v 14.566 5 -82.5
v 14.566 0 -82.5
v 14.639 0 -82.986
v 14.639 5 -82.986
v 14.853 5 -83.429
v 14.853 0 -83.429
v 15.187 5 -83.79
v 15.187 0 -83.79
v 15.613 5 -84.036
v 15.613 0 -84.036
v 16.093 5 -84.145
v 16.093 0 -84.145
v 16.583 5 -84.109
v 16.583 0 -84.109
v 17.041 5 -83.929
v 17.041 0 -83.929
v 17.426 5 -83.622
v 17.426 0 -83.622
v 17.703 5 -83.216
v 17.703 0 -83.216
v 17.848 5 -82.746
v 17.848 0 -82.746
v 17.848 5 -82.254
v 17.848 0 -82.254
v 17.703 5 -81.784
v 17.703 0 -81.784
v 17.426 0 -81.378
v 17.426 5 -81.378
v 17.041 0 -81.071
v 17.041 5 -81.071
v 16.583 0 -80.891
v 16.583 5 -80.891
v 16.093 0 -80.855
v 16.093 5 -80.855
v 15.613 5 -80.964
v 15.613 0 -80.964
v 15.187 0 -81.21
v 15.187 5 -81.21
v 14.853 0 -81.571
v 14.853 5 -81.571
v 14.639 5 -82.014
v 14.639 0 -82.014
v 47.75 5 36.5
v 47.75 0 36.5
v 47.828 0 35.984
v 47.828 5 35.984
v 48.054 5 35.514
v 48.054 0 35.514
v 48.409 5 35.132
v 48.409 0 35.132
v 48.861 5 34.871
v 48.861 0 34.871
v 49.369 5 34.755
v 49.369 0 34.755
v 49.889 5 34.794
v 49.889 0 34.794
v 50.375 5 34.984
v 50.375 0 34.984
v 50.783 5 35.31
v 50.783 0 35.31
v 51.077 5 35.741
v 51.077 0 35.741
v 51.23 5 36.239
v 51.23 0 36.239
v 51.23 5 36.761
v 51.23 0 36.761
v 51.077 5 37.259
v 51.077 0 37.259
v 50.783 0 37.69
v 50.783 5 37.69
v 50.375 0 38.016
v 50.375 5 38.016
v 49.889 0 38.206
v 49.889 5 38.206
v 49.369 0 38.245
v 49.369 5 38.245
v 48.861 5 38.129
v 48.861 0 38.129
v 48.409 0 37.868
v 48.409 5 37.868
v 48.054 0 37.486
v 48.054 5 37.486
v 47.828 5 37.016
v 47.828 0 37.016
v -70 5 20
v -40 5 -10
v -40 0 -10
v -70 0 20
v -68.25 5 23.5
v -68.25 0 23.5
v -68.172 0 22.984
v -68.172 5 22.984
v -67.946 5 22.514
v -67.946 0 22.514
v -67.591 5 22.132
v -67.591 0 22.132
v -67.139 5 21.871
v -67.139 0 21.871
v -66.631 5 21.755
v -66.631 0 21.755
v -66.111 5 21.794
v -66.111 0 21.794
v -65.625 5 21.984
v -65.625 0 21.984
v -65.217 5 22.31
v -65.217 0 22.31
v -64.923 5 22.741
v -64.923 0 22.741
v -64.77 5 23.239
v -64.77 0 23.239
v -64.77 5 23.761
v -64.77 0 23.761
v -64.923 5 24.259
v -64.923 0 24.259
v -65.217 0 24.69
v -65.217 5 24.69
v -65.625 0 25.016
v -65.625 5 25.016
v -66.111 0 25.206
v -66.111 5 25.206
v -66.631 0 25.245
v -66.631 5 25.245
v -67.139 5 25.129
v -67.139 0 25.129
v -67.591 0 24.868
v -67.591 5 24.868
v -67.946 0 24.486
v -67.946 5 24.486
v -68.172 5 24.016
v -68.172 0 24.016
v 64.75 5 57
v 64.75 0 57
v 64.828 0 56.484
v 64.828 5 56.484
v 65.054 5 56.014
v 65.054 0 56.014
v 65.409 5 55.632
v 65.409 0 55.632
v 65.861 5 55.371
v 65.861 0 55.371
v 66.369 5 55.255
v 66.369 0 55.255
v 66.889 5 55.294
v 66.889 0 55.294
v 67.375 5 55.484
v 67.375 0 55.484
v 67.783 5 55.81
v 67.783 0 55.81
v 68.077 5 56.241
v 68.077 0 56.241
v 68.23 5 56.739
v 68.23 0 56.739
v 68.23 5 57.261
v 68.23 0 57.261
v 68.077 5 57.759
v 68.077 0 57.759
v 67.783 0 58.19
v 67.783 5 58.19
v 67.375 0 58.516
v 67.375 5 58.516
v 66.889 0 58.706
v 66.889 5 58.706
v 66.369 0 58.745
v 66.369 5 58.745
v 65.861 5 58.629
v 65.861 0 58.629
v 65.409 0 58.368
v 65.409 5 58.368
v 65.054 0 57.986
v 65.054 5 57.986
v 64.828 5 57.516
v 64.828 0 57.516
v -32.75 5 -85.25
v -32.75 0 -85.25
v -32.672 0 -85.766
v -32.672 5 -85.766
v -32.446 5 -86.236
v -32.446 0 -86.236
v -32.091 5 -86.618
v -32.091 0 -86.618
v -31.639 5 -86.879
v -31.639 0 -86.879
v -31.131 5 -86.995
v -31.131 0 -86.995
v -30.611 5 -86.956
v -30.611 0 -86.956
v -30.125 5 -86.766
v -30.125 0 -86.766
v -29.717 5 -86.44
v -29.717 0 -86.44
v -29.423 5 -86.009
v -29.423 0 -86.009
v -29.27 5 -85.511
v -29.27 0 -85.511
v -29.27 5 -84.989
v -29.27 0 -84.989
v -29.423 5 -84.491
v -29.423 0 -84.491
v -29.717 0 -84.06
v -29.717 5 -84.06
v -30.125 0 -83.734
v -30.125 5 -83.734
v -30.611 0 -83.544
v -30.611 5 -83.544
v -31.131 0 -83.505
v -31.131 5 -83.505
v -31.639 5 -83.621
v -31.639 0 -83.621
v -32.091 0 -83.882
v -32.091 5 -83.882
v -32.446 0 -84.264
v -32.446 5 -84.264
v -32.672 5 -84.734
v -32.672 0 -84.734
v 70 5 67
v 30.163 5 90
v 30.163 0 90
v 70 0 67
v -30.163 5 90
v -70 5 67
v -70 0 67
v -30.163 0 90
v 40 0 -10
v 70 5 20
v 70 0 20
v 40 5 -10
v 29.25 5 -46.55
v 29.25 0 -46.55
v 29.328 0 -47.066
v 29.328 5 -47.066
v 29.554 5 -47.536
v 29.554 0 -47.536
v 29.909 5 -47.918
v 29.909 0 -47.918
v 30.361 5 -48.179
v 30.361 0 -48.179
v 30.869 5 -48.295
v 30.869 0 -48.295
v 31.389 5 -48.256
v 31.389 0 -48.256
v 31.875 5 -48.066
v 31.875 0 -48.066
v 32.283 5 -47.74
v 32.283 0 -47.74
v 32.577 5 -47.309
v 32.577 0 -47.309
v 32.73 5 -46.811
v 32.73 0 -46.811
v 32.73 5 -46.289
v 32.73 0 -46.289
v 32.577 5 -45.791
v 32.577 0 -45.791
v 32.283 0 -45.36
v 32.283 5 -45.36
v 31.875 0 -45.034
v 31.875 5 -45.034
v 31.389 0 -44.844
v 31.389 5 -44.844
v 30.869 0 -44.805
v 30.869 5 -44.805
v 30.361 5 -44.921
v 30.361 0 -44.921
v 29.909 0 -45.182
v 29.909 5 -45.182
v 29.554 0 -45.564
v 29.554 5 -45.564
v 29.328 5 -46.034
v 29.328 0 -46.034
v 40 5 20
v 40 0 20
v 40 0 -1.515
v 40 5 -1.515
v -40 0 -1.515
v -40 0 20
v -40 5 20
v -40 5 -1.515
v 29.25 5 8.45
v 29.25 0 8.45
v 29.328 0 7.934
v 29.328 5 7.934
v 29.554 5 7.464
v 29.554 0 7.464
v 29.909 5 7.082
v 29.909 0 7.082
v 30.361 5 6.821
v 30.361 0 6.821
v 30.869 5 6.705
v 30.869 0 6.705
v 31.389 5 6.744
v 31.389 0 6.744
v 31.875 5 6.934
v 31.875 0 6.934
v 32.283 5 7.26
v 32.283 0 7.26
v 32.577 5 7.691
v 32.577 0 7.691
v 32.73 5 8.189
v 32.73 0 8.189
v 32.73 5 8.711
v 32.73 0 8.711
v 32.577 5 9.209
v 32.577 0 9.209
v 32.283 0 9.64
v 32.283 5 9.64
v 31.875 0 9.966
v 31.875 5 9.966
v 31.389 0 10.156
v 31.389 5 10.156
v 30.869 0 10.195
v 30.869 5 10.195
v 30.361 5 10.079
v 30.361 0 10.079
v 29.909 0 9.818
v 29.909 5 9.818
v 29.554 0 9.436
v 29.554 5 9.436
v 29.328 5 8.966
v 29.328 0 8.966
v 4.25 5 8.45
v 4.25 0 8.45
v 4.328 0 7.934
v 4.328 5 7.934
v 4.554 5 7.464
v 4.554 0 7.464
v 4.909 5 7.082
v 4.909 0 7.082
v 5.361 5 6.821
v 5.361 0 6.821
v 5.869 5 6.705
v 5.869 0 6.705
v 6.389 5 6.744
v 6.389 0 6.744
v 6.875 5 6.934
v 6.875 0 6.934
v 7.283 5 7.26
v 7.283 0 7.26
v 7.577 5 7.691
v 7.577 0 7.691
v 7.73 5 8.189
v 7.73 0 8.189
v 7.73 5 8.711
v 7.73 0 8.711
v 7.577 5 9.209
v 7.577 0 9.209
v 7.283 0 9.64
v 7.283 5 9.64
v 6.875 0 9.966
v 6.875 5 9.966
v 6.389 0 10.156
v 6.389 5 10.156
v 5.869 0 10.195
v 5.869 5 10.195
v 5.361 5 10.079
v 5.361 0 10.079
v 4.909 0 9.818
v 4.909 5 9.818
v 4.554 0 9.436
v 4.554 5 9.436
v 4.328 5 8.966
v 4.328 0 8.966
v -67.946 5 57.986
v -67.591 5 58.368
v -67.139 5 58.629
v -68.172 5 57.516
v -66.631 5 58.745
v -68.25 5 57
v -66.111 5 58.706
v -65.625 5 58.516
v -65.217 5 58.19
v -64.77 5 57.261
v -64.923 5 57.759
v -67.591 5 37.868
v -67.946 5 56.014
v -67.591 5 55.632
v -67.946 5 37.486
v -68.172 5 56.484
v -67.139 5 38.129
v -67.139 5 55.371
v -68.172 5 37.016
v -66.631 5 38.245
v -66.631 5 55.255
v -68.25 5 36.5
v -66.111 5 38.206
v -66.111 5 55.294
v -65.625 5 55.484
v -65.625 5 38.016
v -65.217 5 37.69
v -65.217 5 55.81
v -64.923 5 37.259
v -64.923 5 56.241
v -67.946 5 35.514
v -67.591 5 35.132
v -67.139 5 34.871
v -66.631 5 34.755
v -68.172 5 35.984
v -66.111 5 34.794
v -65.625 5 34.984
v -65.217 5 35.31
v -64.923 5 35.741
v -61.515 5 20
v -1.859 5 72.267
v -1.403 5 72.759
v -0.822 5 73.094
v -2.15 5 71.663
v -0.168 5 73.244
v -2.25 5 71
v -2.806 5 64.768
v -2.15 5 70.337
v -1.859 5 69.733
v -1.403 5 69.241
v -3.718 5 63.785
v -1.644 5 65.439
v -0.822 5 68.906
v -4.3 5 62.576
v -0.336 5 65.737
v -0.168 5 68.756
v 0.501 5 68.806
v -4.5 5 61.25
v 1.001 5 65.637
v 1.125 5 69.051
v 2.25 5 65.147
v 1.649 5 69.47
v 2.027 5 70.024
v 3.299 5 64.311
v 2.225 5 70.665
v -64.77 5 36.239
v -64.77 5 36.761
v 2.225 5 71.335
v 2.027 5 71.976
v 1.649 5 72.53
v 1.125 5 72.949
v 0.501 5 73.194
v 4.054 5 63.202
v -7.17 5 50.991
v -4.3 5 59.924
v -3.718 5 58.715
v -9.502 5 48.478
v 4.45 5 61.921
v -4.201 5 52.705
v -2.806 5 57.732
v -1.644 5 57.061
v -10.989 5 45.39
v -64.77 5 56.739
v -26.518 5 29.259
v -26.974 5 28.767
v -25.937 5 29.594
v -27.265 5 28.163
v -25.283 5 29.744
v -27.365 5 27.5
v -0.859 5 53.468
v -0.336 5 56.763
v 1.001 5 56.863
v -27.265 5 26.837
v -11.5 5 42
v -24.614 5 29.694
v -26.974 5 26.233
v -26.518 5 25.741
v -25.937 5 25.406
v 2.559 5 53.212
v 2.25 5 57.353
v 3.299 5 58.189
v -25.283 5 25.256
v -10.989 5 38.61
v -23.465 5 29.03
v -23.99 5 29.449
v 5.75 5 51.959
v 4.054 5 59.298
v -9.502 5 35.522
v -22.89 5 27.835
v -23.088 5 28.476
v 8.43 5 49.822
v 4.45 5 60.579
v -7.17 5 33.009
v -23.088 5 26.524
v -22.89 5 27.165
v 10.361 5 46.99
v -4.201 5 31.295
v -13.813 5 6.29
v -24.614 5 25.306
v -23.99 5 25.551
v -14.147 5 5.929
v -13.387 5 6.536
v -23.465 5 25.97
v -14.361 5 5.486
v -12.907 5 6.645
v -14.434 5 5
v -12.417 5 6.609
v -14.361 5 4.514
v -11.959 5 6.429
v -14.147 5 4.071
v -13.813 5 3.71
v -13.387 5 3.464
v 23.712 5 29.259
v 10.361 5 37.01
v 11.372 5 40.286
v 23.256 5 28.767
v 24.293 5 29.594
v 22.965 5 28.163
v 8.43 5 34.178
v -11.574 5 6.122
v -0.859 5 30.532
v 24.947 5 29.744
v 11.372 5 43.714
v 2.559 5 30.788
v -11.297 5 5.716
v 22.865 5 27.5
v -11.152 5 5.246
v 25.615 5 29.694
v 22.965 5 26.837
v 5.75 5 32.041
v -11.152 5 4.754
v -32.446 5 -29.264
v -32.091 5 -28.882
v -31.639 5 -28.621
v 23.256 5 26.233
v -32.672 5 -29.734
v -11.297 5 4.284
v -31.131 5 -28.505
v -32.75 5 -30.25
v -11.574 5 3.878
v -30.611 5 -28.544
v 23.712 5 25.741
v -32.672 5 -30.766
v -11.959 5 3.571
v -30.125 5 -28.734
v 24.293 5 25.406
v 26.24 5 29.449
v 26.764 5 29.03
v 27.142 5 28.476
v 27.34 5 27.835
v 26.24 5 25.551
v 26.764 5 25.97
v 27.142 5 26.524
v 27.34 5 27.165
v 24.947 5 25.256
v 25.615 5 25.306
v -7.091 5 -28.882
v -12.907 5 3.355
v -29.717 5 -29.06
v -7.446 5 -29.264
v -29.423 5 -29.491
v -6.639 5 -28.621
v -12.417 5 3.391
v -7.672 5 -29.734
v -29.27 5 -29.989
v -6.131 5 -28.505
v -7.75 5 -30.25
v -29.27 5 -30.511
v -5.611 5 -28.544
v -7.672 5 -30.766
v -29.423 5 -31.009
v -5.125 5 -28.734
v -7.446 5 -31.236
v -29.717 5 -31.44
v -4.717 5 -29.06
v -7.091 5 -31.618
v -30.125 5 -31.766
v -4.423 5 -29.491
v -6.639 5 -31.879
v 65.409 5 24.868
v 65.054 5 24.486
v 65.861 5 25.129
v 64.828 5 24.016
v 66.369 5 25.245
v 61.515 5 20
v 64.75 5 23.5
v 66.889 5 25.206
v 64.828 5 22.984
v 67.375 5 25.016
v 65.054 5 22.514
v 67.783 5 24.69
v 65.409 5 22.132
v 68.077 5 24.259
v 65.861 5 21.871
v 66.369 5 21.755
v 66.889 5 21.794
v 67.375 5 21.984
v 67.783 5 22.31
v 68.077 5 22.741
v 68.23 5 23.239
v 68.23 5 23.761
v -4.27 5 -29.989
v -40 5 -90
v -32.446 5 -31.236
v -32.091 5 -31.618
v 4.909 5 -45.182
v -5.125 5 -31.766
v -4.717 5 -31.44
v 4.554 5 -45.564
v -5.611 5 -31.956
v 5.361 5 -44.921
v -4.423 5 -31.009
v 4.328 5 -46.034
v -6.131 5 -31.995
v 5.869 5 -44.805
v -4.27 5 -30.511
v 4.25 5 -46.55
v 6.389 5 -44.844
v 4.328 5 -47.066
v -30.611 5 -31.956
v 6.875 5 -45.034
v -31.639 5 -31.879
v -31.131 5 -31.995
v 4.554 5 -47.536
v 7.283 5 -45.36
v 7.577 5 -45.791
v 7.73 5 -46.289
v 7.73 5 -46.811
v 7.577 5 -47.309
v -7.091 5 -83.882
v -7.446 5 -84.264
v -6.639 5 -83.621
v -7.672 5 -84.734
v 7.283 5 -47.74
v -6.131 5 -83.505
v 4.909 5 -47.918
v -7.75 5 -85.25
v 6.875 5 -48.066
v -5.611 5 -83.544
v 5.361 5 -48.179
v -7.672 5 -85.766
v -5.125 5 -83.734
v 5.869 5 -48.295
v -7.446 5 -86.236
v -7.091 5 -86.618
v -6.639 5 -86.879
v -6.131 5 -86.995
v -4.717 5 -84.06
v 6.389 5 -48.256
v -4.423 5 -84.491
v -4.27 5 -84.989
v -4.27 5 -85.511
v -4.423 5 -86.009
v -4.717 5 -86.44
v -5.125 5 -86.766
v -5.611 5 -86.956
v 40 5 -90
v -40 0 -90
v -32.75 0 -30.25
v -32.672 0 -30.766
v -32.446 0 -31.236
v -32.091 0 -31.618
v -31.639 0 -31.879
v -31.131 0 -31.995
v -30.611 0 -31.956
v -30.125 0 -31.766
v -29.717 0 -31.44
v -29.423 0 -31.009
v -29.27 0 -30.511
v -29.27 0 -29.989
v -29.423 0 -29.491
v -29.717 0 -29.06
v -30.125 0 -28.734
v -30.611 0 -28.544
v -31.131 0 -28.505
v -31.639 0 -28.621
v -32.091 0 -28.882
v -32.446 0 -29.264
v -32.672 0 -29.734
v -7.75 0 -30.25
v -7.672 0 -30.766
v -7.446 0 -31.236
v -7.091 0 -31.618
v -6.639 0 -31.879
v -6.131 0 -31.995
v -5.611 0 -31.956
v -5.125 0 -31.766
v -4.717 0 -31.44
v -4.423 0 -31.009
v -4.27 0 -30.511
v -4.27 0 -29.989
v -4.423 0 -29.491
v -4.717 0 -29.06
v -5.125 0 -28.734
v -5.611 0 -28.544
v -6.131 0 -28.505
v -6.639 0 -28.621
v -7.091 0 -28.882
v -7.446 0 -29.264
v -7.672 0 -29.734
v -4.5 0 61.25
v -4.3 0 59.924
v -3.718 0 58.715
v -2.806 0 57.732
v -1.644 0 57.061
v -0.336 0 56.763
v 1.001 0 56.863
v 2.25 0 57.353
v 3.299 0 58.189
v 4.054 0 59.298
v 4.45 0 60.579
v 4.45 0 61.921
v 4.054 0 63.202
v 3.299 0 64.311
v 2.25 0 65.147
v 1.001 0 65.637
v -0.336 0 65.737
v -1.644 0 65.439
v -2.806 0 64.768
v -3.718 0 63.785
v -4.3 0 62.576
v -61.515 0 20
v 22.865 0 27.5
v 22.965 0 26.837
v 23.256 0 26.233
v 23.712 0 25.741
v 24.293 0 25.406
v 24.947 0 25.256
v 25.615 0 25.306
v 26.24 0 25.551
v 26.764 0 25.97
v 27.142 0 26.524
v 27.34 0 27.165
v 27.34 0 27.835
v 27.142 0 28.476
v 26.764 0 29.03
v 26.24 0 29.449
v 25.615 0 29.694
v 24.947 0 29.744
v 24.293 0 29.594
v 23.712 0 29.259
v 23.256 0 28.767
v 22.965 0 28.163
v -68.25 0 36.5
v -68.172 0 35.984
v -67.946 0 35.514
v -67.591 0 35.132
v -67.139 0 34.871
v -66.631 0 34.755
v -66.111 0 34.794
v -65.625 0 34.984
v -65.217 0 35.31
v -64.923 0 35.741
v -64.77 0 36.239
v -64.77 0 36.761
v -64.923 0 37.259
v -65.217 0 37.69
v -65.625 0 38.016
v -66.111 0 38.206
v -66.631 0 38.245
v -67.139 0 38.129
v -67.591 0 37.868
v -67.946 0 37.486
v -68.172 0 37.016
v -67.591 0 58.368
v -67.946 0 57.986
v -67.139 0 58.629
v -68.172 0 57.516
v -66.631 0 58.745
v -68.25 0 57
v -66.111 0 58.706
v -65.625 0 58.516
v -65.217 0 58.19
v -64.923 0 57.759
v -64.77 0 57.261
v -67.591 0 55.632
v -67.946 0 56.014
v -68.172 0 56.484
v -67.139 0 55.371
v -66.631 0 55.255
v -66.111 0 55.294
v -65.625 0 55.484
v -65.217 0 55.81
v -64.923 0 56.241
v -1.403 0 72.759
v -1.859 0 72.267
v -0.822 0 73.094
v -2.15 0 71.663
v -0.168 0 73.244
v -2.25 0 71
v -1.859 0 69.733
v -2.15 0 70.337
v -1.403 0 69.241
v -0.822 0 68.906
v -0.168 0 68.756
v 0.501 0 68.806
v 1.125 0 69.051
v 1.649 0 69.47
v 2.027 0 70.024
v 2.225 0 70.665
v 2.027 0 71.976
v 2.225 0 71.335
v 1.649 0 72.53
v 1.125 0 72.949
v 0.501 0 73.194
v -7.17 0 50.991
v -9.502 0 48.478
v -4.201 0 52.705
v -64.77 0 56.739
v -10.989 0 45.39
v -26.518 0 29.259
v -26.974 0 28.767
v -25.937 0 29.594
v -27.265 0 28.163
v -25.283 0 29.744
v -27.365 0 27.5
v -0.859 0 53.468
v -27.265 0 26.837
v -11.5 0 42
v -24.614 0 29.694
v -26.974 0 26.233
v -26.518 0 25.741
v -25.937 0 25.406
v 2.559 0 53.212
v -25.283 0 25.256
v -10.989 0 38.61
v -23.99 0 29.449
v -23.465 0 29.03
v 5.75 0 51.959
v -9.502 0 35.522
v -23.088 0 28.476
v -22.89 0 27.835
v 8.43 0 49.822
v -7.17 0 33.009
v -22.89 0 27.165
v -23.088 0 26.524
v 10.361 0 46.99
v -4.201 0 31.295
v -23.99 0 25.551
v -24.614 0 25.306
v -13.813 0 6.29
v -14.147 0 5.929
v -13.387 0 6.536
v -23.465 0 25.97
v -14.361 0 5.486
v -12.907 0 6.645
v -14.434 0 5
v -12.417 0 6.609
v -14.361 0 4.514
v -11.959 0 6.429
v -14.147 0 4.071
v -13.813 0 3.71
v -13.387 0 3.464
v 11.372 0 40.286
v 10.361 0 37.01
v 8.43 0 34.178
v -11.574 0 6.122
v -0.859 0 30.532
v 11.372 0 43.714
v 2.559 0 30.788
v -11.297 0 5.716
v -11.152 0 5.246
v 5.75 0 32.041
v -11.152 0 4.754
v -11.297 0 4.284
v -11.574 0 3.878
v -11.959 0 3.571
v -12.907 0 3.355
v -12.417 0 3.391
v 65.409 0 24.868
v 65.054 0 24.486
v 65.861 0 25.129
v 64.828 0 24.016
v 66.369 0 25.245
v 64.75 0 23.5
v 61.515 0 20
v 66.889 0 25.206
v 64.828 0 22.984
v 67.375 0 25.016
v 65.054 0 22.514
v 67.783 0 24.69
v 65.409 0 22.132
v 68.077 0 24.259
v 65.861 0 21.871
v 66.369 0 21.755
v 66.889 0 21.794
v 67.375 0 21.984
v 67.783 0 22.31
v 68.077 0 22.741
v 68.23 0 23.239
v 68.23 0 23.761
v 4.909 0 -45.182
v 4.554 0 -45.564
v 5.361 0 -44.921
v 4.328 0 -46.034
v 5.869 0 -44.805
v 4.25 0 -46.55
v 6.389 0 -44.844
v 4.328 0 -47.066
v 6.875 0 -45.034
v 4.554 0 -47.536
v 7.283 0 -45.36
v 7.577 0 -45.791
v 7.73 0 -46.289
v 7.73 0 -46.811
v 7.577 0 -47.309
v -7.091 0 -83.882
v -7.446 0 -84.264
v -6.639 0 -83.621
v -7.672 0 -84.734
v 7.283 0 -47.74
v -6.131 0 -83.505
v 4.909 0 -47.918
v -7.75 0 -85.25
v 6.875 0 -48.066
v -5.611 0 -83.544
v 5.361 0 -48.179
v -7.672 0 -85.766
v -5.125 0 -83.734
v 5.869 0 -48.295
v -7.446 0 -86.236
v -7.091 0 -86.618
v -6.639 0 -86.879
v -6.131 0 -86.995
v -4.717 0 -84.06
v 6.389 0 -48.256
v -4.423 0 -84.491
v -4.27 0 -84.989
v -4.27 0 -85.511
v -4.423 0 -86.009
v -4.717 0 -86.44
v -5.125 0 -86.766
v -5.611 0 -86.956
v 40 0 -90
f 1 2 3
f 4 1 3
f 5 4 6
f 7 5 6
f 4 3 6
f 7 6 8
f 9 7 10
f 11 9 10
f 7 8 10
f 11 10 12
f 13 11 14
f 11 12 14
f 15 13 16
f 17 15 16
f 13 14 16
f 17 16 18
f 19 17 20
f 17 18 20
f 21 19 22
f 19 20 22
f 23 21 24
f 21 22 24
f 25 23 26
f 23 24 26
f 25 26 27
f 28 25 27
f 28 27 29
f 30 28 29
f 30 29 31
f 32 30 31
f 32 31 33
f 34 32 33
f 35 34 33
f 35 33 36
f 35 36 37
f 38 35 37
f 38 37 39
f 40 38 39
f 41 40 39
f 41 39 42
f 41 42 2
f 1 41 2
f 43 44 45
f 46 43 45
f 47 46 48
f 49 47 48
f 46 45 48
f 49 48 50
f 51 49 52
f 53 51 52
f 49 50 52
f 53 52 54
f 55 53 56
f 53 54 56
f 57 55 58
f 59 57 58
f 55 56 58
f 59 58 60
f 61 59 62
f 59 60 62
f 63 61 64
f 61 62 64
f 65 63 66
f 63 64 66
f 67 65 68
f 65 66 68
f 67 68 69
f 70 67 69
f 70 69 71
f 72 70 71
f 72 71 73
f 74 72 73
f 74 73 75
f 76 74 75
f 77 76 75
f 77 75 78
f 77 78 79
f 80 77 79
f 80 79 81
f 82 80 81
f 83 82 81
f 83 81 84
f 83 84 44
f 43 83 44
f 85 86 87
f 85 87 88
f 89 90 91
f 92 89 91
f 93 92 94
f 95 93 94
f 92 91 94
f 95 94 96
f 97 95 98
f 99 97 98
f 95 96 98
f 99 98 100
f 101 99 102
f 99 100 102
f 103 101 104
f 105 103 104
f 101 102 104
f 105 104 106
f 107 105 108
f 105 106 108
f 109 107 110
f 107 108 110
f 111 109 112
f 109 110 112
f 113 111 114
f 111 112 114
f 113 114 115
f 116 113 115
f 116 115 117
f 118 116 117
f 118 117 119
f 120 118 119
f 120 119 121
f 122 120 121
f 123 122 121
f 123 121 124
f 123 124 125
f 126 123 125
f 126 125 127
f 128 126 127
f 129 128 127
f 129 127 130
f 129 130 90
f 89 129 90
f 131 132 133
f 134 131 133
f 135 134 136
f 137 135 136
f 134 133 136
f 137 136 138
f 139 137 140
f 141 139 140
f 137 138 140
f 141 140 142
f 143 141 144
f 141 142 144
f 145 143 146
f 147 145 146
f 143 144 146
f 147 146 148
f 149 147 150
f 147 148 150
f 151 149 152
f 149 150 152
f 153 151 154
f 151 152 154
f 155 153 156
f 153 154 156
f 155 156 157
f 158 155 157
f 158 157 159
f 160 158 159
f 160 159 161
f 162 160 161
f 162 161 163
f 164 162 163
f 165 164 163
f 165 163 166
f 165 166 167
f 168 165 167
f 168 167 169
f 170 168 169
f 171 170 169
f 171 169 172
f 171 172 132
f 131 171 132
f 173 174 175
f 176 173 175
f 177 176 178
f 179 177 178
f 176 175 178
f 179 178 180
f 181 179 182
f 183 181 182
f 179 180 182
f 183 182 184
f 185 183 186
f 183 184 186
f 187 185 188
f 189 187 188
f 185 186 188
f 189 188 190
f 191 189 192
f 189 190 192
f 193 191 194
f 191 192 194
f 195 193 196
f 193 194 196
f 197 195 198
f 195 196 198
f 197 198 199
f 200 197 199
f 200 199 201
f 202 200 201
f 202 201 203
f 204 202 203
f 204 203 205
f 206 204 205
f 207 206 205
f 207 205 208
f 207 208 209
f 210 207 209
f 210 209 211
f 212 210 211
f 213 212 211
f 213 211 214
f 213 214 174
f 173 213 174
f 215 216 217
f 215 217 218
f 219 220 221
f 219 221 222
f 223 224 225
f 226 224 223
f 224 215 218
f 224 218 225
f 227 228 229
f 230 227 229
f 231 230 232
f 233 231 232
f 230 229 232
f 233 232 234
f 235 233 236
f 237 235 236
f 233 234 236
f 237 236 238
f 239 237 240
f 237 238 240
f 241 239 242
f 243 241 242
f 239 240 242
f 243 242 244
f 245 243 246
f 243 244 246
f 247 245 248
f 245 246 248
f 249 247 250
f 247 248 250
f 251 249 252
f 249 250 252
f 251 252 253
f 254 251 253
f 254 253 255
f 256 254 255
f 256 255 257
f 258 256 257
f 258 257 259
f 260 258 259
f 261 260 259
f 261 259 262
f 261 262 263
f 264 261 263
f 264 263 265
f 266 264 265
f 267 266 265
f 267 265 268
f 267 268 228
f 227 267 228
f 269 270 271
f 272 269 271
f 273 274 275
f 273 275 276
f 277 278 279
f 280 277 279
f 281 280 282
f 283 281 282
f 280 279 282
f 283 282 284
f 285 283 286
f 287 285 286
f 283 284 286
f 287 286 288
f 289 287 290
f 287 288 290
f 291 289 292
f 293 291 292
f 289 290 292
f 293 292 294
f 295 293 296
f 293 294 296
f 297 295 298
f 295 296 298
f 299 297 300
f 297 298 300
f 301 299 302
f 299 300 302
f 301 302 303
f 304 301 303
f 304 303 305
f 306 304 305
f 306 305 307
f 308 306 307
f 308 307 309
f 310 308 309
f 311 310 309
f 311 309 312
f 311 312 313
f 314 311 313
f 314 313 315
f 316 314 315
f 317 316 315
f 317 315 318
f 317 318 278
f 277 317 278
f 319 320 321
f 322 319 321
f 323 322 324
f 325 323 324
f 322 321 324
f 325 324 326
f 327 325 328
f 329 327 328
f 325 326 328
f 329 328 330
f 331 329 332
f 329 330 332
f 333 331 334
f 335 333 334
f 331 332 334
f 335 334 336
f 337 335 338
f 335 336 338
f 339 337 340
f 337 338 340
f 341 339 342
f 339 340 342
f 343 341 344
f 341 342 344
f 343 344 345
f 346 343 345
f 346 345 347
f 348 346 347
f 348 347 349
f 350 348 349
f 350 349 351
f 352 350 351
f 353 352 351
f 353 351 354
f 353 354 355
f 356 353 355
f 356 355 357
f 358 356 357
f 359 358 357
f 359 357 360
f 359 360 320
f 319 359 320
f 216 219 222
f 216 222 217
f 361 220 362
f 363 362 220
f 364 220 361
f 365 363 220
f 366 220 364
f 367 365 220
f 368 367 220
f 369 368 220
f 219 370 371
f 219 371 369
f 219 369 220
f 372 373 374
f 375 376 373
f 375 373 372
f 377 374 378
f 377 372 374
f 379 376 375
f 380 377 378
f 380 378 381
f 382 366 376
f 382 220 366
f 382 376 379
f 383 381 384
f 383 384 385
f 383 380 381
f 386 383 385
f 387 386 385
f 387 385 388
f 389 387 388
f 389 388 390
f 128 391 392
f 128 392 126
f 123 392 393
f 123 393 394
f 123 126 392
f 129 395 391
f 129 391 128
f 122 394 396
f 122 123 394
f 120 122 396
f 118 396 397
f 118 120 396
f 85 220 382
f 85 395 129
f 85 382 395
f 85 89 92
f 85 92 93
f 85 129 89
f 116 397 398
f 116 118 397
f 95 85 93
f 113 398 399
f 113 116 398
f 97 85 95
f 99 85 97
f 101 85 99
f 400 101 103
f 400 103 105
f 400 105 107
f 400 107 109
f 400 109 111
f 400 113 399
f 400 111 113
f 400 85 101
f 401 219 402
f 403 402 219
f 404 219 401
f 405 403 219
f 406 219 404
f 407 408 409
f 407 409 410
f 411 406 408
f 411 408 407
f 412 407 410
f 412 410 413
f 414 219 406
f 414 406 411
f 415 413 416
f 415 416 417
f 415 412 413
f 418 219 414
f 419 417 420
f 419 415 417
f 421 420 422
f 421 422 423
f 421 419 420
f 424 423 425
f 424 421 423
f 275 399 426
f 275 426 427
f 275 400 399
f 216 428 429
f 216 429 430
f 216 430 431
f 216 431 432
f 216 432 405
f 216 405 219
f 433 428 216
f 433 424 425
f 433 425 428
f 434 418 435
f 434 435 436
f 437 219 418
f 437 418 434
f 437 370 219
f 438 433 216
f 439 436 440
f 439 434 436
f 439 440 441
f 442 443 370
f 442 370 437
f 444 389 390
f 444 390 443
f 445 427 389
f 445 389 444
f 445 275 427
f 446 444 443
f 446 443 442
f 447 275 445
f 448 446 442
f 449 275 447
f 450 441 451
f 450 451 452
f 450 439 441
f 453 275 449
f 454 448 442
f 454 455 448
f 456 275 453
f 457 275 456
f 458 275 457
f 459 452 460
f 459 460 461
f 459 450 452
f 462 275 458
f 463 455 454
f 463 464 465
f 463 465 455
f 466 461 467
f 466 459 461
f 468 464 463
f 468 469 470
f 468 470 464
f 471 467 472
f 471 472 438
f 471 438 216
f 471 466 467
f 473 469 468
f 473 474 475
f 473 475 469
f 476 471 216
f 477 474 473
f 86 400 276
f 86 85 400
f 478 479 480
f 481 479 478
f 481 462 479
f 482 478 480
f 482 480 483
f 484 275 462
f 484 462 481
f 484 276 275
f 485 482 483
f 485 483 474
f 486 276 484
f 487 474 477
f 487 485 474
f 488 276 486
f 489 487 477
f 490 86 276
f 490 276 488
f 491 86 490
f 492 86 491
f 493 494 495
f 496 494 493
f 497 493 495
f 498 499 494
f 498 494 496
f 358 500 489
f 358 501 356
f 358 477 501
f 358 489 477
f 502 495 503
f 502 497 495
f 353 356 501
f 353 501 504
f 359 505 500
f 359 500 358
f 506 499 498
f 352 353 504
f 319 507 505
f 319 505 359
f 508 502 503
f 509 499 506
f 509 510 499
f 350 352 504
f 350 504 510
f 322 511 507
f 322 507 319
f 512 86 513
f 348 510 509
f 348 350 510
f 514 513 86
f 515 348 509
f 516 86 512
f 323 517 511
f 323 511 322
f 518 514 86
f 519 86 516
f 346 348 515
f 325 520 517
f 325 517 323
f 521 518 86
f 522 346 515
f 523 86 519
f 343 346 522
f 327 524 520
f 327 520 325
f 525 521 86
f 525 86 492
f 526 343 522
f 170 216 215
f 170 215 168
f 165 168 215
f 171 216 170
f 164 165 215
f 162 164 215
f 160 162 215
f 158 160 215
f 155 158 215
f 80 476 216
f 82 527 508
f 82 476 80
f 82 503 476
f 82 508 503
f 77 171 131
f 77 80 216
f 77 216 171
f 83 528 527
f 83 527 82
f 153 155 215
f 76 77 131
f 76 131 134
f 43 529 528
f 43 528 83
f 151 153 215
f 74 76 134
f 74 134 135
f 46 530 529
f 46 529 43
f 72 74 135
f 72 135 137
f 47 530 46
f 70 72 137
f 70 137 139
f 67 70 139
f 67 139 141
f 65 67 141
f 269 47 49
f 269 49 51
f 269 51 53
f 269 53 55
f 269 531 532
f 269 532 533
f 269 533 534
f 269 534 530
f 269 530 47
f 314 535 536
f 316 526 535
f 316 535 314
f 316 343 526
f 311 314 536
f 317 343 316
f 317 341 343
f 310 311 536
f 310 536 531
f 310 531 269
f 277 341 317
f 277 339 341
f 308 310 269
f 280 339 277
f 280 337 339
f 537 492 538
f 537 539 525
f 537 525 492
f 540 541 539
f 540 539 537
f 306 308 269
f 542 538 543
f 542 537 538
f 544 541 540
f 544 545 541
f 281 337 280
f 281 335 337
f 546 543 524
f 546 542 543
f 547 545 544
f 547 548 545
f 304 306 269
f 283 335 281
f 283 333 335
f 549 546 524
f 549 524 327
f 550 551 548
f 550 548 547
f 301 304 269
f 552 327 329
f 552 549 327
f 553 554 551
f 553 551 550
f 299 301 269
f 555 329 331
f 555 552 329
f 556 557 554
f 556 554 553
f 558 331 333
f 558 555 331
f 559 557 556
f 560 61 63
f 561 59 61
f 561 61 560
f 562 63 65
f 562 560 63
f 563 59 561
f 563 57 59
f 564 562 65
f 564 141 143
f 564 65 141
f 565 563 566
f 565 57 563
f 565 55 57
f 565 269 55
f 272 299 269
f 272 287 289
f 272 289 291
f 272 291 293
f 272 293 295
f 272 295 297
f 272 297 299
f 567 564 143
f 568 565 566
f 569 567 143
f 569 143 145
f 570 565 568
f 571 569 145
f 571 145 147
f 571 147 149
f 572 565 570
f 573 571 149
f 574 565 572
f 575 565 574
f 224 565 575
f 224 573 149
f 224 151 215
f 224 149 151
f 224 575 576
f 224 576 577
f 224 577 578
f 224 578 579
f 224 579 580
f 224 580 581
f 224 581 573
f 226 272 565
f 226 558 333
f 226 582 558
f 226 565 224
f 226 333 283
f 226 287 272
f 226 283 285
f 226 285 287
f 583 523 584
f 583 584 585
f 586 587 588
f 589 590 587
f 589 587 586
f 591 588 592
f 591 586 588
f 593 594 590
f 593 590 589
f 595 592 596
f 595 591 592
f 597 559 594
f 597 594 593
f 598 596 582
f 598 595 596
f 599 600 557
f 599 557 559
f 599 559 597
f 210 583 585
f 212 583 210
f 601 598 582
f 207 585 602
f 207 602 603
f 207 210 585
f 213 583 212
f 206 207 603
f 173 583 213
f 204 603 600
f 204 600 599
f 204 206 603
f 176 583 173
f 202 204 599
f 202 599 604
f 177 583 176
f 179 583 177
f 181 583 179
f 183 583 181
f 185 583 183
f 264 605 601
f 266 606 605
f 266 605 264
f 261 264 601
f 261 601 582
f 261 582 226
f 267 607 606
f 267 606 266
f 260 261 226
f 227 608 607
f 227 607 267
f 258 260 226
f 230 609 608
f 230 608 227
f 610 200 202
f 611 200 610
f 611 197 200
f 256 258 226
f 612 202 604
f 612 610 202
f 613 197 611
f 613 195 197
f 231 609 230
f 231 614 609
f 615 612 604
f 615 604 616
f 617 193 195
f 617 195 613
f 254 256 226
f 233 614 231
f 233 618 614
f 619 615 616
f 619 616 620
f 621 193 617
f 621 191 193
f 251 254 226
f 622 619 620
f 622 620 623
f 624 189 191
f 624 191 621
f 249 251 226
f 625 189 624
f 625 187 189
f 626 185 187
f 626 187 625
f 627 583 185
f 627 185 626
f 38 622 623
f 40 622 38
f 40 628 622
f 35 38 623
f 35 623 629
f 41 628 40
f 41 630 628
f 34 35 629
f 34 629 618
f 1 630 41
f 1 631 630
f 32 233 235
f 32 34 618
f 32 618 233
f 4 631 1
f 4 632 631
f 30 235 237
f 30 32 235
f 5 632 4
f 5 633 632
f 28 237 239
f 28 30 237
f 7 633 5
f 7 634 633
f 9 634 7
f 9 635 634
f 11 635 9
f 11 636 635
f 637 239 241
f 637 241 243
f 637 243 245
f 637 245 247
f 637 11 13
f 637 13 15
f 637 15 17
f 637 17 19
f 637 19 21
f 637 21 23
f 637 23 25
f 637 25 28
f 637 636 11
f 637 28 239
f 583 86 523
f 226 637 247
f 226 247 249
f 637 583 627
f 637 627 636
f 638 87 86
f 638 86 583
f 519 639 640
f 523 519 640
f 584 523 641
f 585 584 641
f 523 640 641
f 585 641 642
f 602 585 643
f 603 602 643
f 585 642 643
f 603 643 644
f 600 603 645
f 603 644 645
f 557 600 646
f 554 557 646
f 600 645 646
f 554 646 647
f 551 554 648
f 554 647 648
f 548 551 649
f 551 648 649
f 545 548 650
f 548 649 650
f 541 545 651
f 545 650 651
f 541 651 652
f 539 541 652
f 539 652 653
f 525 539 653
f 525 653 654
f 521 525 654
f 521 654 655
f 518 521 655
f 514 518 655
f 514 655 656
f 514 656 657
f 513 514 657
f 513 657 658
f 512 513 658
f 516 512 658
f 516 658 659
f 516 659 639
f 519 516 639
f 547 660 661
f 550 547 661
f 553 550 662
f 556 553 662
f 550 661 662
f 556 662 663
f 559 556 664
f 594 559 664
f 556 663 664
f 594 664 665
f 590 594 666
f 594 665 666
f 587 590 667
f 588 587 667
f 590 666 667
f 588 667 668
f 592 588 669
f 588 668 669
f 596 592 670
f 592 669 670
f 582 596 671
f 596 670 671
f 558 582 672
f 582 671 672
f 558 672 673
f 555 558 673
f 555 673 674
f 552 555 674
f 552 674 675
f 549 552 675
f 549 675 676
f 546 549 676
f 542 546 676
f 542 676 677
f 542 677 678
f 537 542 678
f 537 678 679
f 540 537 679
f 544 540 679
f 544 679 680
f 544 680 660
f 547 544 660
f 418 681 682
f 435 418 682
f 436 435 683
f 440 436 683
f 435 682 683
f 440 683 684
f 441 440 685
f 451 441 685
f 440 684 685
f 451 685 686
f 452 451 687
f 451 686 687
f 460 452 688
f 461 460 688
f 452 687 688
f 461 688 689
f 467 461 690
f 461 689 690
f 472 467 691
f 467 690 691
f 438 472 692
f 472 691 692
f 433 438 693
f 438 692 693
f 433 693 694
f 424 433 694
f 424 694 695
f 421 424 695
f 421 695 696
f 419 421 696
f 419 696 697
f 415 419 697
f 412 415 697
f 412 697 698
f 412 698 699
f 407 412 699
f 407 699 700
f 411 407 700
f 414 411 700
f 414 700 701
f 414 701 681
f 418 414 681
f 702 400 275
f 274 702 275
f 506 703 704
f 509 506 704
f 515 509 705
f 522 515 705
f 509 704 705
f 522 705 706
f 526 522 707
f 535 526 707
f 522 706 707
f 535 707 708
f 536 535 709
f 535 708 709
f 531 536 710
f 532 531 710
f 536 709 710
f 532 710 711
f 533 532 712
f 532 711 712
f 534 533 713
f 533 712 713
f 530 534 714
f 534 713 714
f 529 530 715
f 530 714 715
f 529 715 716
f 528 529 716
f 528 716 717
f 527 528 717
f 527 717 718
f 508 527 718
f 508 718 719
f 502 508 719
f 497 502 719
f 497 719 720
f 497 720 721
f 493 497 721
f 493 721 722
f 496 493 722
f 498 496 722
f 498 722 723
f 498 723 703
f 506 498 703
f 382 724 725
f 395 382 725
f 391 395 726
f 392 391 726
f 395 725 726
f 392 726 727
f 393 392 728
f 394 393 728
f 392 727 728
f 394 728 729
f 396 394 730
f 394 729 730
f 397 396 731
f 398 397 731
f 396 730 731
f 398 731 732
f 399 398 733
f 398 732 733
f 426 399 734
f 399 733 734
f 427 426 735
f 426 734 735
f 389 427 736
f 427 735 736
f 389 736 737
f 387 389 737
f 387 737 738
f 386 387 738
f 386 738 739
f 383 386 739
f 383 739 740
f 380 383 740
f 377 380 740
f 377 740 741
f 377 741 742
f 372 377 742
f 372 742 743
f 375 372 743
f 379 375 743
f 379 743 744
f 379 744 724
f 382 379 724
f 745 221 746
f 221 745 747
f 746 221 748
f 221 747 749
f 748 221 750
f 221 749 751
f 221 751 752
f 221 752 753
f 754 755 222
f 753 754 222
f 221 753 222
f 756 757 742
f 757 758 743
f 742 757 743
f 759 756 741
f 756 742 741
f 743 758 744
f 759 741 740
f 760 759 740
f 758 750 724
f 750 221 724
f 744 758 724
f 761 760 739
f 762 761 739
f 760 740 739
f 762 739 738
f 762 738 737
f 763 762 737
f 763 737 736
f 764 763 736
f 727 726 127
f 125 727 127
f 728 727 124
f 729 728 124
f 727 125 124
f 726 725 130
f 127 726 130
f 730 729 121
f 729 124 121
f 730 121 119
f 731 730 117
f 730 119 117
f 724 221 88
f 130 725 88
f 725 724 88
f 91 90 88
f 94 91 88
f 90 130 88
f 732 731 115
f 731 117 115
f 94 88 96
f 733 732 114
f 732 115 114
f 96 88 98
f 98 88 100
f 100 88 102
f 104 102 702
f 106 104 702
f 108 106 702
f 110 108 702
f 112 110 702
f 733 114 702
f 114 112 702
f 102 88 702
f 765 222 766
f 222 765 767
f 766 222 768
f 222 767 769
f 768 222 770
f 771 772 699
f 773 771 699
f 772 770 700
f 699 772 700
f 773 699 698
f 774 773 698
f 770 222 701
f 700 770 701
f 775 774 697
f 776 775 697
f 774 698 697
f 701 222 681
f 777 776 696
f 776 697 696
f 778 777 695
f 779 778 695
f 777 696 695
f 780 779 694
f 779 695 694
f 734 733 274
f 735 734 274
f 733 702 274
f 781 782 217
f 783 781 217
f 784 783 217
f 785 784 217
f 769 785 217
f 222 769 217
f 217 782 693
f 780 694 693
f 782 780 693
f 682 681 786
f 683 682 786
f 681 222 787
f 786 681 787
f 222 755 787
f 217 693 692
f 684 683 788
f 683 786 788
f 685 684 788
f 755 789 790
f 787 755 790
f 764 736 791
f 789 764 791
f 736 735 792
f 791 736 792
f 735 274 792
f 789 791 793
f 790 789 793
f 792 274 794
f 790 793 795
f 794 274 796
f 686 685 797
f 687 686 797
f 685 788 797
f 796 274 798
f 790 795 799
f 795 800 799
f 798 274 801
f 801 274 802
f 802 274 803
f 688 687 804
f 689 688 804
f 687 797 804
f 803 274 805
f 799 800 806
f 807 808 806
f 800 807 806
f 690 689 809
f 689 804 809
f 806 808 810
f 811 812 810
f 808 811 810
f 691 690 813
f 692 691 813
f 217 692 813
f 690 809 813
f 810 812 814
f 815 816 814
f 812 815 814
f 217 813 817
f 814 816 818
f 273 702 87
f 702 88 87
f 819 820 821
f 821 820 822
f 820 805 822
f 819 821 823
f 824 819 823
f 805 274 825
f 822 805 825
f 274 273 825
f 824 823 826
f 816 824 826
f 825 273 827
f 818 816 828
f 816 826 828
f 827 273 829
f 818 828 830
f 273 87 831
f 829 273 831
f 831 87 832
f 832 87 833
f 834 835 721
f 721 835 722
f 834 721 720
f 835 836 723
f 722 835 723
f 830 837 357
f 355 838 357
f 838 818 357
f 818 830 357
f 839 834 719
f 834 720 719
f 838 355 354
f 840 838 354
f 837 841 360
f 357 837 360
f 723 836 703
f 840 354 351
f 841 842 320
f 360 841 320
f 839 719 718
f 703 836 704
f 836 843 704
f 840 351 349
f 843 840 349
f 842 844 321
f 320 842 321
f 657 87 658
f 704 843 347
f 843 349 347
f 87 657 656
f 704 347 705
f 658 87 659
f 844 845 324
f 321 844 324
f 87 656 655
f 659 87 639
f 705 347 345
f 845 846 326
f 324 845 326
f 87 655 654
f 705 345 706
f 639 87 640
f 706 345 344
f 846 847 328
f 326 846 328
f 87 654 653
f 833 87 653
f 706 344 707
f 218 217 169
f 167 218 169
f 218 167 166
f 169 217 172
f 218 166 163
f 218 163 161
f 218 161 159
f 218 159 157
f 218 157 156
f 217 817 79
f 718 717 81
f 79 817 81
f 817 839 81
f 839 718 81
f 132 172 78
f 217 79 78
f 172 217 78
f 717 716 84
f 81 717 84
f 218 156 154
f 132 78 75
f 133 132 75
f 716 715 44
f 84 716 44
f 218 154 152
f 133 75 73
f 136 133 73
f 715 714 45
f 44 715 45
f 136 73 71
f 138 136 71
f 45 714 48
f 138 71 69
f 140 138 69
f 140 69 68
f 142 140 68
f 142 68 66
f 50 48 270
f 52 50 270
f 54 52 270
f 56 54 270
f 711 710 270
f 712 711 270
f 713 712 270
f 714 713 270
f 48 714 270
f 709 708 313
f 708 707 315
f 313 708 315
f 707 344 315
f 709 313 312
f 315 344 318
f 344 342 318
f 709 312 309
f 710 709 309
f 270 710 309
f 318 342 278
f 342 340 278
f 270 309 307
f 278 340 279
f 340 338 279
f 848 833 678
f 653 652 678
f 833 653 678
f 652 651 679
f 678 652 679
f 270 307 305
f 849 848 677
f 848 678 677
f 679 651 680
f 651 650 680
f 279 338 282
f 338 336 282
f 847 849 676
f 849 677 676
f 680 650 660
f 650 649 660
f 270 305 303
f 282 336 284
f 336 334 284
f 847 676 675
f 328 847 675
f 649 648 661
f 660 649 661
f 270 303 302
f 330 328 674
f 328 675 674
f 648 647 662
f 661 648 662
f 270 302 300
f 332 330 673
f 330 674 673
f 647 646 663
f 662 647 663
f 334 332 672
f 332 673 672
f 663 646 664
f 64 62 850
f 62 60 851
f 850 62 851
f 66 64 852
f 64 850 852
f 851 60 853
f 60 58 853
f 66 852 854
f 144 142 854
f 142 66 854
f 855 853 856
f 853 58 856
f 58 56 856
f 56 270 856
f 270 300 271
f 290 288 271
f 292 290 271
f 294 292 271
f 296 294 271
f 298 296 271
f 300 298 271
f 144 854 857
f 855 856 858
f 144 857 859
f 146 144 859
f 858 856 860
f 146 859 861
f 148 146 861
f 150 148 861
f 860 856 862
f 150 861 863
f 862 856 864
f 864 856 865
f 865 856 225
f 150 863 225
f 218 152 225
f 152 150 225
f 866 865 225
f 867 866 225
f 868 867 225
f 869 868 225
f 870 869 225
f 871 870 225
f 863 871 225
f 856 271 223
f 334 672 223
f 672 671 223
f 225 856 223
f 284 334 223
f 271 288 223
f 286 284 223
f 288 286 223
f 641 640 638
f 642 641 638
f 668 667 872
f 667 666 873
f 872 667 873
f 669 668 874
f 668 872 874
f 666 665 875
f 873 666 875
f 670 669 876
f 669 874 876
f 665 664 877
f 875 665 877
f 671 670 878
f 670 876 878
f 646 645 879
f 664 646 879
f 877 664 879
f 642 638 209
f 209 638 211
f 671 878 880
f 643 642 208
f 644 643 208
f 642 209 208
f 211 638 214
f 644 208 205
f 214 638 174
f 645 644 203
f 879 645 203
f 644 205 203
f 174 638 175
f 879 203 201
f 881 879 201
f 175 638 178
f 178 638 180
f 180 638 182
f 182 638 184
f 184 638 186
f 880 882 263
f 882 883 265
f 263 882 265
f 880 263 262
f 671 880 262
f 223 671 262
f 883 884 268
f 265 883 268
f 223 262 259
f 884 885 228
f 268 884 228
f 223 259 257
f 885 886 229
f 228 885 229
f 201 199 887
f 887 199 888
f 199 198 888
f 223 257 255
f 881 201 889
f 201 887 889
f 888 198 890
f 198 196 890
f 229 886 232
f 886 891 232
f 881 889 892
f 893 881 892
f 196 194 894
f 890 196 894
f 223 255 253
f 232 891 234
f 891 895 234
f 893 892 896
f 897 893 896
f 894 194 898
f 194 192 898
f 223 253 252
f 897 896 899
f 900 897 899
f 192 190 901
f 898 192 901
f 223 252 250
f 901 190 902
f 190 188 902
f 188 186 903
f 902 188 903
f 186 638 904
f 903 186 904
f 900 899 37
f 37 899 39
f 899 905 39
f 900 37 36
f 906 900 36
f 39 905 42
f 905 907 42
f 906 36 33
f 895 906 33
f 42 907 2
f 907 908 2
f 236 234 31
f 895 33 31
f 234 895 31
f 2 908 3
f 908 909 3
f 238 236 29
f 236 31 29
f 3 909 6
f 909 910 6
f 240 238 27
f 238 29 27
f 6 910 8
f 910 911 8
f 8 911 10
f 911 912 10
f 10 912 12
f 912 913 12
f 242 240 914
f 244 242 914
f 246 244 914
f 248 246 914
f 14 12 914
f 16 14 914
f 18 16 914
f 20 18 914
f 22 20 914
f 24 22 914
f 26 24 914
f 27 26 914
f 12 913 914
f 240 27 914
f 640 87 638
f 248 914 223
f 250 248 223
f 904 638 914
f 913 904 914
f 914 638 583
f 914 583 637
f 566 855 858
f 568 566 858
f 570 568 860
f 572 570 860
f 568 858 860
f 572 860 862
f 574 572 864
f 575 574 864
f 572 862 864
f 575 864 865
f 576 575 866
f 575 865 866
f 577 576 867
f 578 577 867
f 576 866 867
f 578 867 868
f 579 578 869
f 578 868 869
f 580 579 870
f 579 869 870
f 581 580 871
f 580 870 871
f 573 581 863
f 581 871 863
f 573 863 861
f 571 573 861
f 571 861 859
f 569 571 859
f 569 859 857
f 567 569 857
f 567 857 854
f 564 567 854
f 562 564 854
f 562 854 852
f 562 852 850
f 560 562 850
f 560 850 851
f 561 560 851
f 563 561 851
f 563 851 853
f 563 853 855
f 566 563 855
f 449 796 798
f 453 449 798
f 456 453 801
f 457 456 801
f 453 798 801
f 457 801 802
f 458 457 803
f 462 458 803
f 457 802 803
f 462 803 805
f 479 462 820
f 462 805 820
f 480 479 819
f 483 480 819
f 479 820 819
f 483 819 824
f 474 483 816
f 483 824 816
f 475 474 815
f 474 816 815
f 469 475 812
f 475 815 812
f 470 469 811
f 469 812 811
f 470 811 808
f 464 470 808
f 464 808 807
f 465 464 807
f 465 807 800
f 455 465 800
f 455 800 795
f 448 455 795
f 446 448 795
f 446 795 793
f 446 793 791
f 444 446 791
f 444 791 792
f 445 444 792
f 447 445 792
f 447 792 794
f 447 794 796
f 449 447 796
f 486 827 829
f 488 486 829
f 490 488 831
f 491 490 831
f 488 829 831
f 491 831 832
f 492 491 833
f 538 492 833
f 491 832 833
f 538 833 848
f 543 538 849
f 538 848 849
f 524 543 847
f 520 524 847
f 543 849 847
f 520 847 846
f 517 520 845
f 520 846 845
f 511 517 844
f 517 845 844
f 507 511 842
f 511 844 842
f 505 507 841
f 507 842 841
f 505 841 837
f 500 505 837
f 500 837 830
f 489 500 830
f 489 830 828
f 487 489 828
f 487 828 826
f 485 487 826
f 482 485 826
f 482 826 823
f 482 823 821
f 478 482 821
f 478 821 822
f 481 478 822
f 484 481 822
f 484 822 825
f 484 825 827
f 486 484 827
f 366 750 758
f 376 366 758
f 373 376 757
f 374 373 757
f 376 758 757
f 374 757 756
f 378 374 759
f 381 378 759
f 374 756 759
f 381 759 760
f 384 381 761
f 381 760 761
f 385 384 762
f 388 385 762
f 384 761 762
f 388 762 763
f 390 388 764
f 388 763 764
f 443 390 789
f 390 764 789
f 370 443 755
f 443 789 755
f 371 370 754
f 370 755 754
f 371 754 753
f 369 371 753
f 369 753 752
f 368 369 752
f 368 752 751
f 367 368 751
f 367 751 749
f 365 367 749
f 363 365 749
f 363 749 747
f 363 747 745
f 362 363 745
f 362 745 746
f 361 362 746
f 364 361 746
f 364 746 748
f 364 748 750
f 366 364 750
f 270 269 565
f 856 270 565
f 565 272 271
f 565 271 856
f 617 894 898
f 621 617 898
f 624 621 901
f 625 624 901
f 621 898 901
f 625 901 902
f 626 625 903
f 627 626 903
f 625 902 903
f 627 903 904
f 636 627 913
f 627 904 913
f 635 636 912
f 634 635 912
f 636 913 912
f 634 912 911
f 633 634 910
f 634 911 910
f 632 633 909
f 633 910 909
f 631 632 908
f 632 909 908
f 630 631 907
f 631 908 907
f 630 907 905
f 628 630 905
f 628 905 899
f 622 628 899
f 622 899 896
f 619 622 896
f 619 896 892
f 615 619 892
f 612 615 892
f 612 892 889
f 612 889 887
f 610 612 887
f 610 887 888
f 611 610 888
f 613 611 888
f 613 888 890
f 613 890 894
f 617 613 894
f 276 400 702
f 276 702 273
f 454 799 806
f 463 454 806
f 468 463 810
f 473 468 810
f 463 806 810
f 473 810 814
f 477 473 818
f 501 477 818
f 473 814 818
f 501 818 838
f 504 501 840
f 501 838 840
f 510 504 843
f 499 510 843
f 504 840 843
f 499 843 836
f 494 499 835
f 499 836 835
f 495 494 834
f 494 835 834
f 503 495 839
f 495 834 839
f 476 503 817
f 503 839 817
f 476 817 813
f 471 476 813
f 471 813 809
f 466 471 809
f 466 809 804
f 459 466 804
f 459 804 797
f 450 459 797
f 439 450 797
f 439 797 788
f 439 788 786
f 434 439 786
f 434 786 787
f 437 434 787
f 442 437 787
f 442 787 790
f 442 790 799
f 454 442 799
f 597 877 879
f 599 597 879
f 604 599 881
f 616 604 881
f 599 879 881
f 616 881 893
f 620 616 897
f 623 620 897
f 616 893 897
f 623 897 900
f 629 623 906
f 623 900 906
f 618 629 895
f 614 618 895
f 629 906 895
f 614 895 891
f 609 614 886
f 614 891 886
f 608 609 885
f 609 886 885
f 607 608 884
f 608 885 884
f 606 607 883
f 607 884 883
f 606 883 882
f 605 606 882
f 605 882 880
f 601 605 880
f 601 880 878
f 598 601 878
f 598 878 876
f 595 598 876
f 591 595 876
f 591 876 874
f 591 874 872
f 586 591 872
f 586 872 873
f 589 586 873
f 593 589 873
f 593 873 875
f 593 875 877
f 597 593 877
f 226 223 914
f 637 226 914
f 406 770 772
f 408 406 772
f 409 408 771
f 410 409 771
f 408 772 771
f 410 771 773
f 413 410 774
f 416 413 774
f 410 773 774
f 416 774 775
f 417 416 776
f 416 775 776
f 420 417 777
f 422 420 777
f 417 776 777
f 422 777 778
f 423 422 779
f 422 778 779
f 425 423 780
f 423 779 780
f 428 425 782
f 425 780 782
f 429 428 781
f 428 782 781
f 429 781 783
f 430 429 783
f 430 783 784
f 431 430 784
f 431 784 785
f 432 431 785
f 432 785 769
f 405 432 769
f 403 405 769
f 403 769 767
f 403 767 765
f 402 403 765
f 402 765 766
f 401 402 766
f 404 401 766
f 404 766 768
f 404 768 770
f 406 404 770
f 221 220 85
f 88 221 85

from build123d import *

# Parameters (mm, degrees)
SKETCH_1_W          = 80
SKETCH_1_H          = 180
EXTRUDE_1_DEPTH     = 5
HOLE_WIZARD_1_D     = 3.5
HOLE_WIZARD_2_D     = 4.5
HOLE_WIZARD_3_D     = 23
HOLE_WIZARD_4_D     = 9
SKETCH_13_W         = 30
SKETCH_13_H         = 70
EXTRUDE_2_DEPTH     = 5
EXTRUDE_3_DEPTH     = 5
HOLE_WIZARD_5_D     = 3.5
CUT_EXTRUDE_1_DEPTH = 5
HOLE_WIZARD_6_D     = 3.5
HOLE_WIZARD_7_D     = 3.5
HOLE_WIZARD_8_D     = 3.3
HOLE_WIZARD_9_D     = 3.5


with BuildPart() as part:
    # 草图1 → 凸台-拉伸1 (new body)
    with BuildSketch(Plane(origin=(0, 0, 0), x_dir=(1, 0, 0), z_dir=(0, 1, 0))):
        Rectangle(SKETCH_1_W, SKETCH_1_H)
    extrude(amount=EXTRUDE_1_DEPTH)

    # 孔1 (through all)
    with Locations(Plane(origin=(0, 5, 0), x_dir=(1, 0, 0), z_dir=(0, 1, 0))):
        with Locations((-31, 85.25), (-6, 85.25), (-6, 30.25), (-31, 30.25), (6, -8.45), (6, 46.55), (31, 46.55), (31, -8.45)):
            Hole(HOLE_WIZARD_1_D / 2)

    # 孔2 (through all)
    with Locations(Plane(origin=(0, 5, 0), x_dir=(1, 0, 0), z_dir=(0, 1, 0))):
        with Locations((0, -71), (25.11473671, -27.5), (-25.11473671, -27.5)):
            Hole(HOLE_WIZARD_2_D / 2)

    # 孔3 (through all)
    with Locations(Plane(origin=(0, 5, 0), x_dir=(1, 0, 0), z_dir=(0, 1, 0))):
        with Locations((0, -42)):
            Hole(HOLE_WIZARD_3_D / 2)

    # 孔4 (through all)
    with Locations(Plane(origin=(0, 5, 0), x_dir=(1, 0, 0), z_dir=(0, 1, 0))):
        with Locations((0, -61.25)):
            Hole(HOLE_WIZARD_4_D / 2)

    # 草图13 → 凸台-拉伸2 (add)
    with BuildSketch(Plane(origin=(0, 5, 0), x_dir=(1, 0, 0), z_dir=(0, 1, 0))):
        with Locations((-55, -55)):
            Rectangle(SKETCH_13_W, SKETCH_13_H)
        with Locations((55, -55)):
            Rectangle(SKETCH_13_W, SKETCH_13_H)
    extrude(amount=-EXTRUDE_2_DEPTH)

    # 草图15 → 凸台-拉伸3 (add)
    with BuildSketch(Plane(origin=(0, 5, 0), x_dir=(1, 0, 0), z_dir=(0, 1, 0))):
        Polygon((-40, 10), (-70, -20), (-61.514718626, -20), (-40, 1.514718626), align=None)
        Polygon((61.514718626, -20), (70, -20), (40, 10), (40, 1.514718626), align=None)
    extrude(amount=-EXTRUDE_3_DEPTH)

    # 孔5 (through all)
    with Locations(Plane(origin=(0, 5, 0), x_dir=(1, 0, 0), z_dir=(0, 1, 0))):
        with Locations((-66.5, -57), (66.5, -57)):
            Hole(HOLE_WIZARD_5_D / 2)

    # 草图19 → 切除-拉伸1 (cut)
    with BuildSketch(Plane(origin=(0, 5, 0), x_dir=(1, 0, 0), z_dir=(0, 1, 0))):
        Polygon((-70, -67), (-30.162831426, -90), (-70, -90), align=None)
        Polygon((30.162831426, -90), (70, -67), (70, -90), align=None)
    extrude(amount=-CUT_EXTRUDE_1_DEPTH, mode=Mode.SUBTRACT)

    # 孔6 (through all)
    with Locations(Plane(origin=(0, 5, 0), x_dir=(1, 0, 0), z_dir=(0, 1, 0))):
        with Locations((-66.5, -23.5), (66.5, -23.5)):
            Hole(HOLE_WIZARD_6_D / 2)

    # 孔7 (through all)
    with Locations(Plane(origin=(0, 5, 0), x_dir=(1, 0, 0), z_dir=(0, 1, 0))):
        with Locations((49.5, -36.5)):
            Hole(HOLE_WIZARD_7_D / 2)

    # 孔8 (through all)
    with Locations(Plane(origin=(0, 5, 0), x_dir=(1, 0, 0), z_dir=(0, 1, 0))):
        with Locations((-12.784, -5), (16.216, 82.5)):
            Hole(HOLE_WIZARD_8_D / 2)

    # 孔9 (through all)
    with Locations(Plane(origin=(0, 5, 0), x_dir=(1, 0, 0), z_dir=(0, 1, 0))):
        with Locations((-66.5, -36.5)):
            Hole(HOLE_WIZARD_9_D / 2)


solid = part.part
